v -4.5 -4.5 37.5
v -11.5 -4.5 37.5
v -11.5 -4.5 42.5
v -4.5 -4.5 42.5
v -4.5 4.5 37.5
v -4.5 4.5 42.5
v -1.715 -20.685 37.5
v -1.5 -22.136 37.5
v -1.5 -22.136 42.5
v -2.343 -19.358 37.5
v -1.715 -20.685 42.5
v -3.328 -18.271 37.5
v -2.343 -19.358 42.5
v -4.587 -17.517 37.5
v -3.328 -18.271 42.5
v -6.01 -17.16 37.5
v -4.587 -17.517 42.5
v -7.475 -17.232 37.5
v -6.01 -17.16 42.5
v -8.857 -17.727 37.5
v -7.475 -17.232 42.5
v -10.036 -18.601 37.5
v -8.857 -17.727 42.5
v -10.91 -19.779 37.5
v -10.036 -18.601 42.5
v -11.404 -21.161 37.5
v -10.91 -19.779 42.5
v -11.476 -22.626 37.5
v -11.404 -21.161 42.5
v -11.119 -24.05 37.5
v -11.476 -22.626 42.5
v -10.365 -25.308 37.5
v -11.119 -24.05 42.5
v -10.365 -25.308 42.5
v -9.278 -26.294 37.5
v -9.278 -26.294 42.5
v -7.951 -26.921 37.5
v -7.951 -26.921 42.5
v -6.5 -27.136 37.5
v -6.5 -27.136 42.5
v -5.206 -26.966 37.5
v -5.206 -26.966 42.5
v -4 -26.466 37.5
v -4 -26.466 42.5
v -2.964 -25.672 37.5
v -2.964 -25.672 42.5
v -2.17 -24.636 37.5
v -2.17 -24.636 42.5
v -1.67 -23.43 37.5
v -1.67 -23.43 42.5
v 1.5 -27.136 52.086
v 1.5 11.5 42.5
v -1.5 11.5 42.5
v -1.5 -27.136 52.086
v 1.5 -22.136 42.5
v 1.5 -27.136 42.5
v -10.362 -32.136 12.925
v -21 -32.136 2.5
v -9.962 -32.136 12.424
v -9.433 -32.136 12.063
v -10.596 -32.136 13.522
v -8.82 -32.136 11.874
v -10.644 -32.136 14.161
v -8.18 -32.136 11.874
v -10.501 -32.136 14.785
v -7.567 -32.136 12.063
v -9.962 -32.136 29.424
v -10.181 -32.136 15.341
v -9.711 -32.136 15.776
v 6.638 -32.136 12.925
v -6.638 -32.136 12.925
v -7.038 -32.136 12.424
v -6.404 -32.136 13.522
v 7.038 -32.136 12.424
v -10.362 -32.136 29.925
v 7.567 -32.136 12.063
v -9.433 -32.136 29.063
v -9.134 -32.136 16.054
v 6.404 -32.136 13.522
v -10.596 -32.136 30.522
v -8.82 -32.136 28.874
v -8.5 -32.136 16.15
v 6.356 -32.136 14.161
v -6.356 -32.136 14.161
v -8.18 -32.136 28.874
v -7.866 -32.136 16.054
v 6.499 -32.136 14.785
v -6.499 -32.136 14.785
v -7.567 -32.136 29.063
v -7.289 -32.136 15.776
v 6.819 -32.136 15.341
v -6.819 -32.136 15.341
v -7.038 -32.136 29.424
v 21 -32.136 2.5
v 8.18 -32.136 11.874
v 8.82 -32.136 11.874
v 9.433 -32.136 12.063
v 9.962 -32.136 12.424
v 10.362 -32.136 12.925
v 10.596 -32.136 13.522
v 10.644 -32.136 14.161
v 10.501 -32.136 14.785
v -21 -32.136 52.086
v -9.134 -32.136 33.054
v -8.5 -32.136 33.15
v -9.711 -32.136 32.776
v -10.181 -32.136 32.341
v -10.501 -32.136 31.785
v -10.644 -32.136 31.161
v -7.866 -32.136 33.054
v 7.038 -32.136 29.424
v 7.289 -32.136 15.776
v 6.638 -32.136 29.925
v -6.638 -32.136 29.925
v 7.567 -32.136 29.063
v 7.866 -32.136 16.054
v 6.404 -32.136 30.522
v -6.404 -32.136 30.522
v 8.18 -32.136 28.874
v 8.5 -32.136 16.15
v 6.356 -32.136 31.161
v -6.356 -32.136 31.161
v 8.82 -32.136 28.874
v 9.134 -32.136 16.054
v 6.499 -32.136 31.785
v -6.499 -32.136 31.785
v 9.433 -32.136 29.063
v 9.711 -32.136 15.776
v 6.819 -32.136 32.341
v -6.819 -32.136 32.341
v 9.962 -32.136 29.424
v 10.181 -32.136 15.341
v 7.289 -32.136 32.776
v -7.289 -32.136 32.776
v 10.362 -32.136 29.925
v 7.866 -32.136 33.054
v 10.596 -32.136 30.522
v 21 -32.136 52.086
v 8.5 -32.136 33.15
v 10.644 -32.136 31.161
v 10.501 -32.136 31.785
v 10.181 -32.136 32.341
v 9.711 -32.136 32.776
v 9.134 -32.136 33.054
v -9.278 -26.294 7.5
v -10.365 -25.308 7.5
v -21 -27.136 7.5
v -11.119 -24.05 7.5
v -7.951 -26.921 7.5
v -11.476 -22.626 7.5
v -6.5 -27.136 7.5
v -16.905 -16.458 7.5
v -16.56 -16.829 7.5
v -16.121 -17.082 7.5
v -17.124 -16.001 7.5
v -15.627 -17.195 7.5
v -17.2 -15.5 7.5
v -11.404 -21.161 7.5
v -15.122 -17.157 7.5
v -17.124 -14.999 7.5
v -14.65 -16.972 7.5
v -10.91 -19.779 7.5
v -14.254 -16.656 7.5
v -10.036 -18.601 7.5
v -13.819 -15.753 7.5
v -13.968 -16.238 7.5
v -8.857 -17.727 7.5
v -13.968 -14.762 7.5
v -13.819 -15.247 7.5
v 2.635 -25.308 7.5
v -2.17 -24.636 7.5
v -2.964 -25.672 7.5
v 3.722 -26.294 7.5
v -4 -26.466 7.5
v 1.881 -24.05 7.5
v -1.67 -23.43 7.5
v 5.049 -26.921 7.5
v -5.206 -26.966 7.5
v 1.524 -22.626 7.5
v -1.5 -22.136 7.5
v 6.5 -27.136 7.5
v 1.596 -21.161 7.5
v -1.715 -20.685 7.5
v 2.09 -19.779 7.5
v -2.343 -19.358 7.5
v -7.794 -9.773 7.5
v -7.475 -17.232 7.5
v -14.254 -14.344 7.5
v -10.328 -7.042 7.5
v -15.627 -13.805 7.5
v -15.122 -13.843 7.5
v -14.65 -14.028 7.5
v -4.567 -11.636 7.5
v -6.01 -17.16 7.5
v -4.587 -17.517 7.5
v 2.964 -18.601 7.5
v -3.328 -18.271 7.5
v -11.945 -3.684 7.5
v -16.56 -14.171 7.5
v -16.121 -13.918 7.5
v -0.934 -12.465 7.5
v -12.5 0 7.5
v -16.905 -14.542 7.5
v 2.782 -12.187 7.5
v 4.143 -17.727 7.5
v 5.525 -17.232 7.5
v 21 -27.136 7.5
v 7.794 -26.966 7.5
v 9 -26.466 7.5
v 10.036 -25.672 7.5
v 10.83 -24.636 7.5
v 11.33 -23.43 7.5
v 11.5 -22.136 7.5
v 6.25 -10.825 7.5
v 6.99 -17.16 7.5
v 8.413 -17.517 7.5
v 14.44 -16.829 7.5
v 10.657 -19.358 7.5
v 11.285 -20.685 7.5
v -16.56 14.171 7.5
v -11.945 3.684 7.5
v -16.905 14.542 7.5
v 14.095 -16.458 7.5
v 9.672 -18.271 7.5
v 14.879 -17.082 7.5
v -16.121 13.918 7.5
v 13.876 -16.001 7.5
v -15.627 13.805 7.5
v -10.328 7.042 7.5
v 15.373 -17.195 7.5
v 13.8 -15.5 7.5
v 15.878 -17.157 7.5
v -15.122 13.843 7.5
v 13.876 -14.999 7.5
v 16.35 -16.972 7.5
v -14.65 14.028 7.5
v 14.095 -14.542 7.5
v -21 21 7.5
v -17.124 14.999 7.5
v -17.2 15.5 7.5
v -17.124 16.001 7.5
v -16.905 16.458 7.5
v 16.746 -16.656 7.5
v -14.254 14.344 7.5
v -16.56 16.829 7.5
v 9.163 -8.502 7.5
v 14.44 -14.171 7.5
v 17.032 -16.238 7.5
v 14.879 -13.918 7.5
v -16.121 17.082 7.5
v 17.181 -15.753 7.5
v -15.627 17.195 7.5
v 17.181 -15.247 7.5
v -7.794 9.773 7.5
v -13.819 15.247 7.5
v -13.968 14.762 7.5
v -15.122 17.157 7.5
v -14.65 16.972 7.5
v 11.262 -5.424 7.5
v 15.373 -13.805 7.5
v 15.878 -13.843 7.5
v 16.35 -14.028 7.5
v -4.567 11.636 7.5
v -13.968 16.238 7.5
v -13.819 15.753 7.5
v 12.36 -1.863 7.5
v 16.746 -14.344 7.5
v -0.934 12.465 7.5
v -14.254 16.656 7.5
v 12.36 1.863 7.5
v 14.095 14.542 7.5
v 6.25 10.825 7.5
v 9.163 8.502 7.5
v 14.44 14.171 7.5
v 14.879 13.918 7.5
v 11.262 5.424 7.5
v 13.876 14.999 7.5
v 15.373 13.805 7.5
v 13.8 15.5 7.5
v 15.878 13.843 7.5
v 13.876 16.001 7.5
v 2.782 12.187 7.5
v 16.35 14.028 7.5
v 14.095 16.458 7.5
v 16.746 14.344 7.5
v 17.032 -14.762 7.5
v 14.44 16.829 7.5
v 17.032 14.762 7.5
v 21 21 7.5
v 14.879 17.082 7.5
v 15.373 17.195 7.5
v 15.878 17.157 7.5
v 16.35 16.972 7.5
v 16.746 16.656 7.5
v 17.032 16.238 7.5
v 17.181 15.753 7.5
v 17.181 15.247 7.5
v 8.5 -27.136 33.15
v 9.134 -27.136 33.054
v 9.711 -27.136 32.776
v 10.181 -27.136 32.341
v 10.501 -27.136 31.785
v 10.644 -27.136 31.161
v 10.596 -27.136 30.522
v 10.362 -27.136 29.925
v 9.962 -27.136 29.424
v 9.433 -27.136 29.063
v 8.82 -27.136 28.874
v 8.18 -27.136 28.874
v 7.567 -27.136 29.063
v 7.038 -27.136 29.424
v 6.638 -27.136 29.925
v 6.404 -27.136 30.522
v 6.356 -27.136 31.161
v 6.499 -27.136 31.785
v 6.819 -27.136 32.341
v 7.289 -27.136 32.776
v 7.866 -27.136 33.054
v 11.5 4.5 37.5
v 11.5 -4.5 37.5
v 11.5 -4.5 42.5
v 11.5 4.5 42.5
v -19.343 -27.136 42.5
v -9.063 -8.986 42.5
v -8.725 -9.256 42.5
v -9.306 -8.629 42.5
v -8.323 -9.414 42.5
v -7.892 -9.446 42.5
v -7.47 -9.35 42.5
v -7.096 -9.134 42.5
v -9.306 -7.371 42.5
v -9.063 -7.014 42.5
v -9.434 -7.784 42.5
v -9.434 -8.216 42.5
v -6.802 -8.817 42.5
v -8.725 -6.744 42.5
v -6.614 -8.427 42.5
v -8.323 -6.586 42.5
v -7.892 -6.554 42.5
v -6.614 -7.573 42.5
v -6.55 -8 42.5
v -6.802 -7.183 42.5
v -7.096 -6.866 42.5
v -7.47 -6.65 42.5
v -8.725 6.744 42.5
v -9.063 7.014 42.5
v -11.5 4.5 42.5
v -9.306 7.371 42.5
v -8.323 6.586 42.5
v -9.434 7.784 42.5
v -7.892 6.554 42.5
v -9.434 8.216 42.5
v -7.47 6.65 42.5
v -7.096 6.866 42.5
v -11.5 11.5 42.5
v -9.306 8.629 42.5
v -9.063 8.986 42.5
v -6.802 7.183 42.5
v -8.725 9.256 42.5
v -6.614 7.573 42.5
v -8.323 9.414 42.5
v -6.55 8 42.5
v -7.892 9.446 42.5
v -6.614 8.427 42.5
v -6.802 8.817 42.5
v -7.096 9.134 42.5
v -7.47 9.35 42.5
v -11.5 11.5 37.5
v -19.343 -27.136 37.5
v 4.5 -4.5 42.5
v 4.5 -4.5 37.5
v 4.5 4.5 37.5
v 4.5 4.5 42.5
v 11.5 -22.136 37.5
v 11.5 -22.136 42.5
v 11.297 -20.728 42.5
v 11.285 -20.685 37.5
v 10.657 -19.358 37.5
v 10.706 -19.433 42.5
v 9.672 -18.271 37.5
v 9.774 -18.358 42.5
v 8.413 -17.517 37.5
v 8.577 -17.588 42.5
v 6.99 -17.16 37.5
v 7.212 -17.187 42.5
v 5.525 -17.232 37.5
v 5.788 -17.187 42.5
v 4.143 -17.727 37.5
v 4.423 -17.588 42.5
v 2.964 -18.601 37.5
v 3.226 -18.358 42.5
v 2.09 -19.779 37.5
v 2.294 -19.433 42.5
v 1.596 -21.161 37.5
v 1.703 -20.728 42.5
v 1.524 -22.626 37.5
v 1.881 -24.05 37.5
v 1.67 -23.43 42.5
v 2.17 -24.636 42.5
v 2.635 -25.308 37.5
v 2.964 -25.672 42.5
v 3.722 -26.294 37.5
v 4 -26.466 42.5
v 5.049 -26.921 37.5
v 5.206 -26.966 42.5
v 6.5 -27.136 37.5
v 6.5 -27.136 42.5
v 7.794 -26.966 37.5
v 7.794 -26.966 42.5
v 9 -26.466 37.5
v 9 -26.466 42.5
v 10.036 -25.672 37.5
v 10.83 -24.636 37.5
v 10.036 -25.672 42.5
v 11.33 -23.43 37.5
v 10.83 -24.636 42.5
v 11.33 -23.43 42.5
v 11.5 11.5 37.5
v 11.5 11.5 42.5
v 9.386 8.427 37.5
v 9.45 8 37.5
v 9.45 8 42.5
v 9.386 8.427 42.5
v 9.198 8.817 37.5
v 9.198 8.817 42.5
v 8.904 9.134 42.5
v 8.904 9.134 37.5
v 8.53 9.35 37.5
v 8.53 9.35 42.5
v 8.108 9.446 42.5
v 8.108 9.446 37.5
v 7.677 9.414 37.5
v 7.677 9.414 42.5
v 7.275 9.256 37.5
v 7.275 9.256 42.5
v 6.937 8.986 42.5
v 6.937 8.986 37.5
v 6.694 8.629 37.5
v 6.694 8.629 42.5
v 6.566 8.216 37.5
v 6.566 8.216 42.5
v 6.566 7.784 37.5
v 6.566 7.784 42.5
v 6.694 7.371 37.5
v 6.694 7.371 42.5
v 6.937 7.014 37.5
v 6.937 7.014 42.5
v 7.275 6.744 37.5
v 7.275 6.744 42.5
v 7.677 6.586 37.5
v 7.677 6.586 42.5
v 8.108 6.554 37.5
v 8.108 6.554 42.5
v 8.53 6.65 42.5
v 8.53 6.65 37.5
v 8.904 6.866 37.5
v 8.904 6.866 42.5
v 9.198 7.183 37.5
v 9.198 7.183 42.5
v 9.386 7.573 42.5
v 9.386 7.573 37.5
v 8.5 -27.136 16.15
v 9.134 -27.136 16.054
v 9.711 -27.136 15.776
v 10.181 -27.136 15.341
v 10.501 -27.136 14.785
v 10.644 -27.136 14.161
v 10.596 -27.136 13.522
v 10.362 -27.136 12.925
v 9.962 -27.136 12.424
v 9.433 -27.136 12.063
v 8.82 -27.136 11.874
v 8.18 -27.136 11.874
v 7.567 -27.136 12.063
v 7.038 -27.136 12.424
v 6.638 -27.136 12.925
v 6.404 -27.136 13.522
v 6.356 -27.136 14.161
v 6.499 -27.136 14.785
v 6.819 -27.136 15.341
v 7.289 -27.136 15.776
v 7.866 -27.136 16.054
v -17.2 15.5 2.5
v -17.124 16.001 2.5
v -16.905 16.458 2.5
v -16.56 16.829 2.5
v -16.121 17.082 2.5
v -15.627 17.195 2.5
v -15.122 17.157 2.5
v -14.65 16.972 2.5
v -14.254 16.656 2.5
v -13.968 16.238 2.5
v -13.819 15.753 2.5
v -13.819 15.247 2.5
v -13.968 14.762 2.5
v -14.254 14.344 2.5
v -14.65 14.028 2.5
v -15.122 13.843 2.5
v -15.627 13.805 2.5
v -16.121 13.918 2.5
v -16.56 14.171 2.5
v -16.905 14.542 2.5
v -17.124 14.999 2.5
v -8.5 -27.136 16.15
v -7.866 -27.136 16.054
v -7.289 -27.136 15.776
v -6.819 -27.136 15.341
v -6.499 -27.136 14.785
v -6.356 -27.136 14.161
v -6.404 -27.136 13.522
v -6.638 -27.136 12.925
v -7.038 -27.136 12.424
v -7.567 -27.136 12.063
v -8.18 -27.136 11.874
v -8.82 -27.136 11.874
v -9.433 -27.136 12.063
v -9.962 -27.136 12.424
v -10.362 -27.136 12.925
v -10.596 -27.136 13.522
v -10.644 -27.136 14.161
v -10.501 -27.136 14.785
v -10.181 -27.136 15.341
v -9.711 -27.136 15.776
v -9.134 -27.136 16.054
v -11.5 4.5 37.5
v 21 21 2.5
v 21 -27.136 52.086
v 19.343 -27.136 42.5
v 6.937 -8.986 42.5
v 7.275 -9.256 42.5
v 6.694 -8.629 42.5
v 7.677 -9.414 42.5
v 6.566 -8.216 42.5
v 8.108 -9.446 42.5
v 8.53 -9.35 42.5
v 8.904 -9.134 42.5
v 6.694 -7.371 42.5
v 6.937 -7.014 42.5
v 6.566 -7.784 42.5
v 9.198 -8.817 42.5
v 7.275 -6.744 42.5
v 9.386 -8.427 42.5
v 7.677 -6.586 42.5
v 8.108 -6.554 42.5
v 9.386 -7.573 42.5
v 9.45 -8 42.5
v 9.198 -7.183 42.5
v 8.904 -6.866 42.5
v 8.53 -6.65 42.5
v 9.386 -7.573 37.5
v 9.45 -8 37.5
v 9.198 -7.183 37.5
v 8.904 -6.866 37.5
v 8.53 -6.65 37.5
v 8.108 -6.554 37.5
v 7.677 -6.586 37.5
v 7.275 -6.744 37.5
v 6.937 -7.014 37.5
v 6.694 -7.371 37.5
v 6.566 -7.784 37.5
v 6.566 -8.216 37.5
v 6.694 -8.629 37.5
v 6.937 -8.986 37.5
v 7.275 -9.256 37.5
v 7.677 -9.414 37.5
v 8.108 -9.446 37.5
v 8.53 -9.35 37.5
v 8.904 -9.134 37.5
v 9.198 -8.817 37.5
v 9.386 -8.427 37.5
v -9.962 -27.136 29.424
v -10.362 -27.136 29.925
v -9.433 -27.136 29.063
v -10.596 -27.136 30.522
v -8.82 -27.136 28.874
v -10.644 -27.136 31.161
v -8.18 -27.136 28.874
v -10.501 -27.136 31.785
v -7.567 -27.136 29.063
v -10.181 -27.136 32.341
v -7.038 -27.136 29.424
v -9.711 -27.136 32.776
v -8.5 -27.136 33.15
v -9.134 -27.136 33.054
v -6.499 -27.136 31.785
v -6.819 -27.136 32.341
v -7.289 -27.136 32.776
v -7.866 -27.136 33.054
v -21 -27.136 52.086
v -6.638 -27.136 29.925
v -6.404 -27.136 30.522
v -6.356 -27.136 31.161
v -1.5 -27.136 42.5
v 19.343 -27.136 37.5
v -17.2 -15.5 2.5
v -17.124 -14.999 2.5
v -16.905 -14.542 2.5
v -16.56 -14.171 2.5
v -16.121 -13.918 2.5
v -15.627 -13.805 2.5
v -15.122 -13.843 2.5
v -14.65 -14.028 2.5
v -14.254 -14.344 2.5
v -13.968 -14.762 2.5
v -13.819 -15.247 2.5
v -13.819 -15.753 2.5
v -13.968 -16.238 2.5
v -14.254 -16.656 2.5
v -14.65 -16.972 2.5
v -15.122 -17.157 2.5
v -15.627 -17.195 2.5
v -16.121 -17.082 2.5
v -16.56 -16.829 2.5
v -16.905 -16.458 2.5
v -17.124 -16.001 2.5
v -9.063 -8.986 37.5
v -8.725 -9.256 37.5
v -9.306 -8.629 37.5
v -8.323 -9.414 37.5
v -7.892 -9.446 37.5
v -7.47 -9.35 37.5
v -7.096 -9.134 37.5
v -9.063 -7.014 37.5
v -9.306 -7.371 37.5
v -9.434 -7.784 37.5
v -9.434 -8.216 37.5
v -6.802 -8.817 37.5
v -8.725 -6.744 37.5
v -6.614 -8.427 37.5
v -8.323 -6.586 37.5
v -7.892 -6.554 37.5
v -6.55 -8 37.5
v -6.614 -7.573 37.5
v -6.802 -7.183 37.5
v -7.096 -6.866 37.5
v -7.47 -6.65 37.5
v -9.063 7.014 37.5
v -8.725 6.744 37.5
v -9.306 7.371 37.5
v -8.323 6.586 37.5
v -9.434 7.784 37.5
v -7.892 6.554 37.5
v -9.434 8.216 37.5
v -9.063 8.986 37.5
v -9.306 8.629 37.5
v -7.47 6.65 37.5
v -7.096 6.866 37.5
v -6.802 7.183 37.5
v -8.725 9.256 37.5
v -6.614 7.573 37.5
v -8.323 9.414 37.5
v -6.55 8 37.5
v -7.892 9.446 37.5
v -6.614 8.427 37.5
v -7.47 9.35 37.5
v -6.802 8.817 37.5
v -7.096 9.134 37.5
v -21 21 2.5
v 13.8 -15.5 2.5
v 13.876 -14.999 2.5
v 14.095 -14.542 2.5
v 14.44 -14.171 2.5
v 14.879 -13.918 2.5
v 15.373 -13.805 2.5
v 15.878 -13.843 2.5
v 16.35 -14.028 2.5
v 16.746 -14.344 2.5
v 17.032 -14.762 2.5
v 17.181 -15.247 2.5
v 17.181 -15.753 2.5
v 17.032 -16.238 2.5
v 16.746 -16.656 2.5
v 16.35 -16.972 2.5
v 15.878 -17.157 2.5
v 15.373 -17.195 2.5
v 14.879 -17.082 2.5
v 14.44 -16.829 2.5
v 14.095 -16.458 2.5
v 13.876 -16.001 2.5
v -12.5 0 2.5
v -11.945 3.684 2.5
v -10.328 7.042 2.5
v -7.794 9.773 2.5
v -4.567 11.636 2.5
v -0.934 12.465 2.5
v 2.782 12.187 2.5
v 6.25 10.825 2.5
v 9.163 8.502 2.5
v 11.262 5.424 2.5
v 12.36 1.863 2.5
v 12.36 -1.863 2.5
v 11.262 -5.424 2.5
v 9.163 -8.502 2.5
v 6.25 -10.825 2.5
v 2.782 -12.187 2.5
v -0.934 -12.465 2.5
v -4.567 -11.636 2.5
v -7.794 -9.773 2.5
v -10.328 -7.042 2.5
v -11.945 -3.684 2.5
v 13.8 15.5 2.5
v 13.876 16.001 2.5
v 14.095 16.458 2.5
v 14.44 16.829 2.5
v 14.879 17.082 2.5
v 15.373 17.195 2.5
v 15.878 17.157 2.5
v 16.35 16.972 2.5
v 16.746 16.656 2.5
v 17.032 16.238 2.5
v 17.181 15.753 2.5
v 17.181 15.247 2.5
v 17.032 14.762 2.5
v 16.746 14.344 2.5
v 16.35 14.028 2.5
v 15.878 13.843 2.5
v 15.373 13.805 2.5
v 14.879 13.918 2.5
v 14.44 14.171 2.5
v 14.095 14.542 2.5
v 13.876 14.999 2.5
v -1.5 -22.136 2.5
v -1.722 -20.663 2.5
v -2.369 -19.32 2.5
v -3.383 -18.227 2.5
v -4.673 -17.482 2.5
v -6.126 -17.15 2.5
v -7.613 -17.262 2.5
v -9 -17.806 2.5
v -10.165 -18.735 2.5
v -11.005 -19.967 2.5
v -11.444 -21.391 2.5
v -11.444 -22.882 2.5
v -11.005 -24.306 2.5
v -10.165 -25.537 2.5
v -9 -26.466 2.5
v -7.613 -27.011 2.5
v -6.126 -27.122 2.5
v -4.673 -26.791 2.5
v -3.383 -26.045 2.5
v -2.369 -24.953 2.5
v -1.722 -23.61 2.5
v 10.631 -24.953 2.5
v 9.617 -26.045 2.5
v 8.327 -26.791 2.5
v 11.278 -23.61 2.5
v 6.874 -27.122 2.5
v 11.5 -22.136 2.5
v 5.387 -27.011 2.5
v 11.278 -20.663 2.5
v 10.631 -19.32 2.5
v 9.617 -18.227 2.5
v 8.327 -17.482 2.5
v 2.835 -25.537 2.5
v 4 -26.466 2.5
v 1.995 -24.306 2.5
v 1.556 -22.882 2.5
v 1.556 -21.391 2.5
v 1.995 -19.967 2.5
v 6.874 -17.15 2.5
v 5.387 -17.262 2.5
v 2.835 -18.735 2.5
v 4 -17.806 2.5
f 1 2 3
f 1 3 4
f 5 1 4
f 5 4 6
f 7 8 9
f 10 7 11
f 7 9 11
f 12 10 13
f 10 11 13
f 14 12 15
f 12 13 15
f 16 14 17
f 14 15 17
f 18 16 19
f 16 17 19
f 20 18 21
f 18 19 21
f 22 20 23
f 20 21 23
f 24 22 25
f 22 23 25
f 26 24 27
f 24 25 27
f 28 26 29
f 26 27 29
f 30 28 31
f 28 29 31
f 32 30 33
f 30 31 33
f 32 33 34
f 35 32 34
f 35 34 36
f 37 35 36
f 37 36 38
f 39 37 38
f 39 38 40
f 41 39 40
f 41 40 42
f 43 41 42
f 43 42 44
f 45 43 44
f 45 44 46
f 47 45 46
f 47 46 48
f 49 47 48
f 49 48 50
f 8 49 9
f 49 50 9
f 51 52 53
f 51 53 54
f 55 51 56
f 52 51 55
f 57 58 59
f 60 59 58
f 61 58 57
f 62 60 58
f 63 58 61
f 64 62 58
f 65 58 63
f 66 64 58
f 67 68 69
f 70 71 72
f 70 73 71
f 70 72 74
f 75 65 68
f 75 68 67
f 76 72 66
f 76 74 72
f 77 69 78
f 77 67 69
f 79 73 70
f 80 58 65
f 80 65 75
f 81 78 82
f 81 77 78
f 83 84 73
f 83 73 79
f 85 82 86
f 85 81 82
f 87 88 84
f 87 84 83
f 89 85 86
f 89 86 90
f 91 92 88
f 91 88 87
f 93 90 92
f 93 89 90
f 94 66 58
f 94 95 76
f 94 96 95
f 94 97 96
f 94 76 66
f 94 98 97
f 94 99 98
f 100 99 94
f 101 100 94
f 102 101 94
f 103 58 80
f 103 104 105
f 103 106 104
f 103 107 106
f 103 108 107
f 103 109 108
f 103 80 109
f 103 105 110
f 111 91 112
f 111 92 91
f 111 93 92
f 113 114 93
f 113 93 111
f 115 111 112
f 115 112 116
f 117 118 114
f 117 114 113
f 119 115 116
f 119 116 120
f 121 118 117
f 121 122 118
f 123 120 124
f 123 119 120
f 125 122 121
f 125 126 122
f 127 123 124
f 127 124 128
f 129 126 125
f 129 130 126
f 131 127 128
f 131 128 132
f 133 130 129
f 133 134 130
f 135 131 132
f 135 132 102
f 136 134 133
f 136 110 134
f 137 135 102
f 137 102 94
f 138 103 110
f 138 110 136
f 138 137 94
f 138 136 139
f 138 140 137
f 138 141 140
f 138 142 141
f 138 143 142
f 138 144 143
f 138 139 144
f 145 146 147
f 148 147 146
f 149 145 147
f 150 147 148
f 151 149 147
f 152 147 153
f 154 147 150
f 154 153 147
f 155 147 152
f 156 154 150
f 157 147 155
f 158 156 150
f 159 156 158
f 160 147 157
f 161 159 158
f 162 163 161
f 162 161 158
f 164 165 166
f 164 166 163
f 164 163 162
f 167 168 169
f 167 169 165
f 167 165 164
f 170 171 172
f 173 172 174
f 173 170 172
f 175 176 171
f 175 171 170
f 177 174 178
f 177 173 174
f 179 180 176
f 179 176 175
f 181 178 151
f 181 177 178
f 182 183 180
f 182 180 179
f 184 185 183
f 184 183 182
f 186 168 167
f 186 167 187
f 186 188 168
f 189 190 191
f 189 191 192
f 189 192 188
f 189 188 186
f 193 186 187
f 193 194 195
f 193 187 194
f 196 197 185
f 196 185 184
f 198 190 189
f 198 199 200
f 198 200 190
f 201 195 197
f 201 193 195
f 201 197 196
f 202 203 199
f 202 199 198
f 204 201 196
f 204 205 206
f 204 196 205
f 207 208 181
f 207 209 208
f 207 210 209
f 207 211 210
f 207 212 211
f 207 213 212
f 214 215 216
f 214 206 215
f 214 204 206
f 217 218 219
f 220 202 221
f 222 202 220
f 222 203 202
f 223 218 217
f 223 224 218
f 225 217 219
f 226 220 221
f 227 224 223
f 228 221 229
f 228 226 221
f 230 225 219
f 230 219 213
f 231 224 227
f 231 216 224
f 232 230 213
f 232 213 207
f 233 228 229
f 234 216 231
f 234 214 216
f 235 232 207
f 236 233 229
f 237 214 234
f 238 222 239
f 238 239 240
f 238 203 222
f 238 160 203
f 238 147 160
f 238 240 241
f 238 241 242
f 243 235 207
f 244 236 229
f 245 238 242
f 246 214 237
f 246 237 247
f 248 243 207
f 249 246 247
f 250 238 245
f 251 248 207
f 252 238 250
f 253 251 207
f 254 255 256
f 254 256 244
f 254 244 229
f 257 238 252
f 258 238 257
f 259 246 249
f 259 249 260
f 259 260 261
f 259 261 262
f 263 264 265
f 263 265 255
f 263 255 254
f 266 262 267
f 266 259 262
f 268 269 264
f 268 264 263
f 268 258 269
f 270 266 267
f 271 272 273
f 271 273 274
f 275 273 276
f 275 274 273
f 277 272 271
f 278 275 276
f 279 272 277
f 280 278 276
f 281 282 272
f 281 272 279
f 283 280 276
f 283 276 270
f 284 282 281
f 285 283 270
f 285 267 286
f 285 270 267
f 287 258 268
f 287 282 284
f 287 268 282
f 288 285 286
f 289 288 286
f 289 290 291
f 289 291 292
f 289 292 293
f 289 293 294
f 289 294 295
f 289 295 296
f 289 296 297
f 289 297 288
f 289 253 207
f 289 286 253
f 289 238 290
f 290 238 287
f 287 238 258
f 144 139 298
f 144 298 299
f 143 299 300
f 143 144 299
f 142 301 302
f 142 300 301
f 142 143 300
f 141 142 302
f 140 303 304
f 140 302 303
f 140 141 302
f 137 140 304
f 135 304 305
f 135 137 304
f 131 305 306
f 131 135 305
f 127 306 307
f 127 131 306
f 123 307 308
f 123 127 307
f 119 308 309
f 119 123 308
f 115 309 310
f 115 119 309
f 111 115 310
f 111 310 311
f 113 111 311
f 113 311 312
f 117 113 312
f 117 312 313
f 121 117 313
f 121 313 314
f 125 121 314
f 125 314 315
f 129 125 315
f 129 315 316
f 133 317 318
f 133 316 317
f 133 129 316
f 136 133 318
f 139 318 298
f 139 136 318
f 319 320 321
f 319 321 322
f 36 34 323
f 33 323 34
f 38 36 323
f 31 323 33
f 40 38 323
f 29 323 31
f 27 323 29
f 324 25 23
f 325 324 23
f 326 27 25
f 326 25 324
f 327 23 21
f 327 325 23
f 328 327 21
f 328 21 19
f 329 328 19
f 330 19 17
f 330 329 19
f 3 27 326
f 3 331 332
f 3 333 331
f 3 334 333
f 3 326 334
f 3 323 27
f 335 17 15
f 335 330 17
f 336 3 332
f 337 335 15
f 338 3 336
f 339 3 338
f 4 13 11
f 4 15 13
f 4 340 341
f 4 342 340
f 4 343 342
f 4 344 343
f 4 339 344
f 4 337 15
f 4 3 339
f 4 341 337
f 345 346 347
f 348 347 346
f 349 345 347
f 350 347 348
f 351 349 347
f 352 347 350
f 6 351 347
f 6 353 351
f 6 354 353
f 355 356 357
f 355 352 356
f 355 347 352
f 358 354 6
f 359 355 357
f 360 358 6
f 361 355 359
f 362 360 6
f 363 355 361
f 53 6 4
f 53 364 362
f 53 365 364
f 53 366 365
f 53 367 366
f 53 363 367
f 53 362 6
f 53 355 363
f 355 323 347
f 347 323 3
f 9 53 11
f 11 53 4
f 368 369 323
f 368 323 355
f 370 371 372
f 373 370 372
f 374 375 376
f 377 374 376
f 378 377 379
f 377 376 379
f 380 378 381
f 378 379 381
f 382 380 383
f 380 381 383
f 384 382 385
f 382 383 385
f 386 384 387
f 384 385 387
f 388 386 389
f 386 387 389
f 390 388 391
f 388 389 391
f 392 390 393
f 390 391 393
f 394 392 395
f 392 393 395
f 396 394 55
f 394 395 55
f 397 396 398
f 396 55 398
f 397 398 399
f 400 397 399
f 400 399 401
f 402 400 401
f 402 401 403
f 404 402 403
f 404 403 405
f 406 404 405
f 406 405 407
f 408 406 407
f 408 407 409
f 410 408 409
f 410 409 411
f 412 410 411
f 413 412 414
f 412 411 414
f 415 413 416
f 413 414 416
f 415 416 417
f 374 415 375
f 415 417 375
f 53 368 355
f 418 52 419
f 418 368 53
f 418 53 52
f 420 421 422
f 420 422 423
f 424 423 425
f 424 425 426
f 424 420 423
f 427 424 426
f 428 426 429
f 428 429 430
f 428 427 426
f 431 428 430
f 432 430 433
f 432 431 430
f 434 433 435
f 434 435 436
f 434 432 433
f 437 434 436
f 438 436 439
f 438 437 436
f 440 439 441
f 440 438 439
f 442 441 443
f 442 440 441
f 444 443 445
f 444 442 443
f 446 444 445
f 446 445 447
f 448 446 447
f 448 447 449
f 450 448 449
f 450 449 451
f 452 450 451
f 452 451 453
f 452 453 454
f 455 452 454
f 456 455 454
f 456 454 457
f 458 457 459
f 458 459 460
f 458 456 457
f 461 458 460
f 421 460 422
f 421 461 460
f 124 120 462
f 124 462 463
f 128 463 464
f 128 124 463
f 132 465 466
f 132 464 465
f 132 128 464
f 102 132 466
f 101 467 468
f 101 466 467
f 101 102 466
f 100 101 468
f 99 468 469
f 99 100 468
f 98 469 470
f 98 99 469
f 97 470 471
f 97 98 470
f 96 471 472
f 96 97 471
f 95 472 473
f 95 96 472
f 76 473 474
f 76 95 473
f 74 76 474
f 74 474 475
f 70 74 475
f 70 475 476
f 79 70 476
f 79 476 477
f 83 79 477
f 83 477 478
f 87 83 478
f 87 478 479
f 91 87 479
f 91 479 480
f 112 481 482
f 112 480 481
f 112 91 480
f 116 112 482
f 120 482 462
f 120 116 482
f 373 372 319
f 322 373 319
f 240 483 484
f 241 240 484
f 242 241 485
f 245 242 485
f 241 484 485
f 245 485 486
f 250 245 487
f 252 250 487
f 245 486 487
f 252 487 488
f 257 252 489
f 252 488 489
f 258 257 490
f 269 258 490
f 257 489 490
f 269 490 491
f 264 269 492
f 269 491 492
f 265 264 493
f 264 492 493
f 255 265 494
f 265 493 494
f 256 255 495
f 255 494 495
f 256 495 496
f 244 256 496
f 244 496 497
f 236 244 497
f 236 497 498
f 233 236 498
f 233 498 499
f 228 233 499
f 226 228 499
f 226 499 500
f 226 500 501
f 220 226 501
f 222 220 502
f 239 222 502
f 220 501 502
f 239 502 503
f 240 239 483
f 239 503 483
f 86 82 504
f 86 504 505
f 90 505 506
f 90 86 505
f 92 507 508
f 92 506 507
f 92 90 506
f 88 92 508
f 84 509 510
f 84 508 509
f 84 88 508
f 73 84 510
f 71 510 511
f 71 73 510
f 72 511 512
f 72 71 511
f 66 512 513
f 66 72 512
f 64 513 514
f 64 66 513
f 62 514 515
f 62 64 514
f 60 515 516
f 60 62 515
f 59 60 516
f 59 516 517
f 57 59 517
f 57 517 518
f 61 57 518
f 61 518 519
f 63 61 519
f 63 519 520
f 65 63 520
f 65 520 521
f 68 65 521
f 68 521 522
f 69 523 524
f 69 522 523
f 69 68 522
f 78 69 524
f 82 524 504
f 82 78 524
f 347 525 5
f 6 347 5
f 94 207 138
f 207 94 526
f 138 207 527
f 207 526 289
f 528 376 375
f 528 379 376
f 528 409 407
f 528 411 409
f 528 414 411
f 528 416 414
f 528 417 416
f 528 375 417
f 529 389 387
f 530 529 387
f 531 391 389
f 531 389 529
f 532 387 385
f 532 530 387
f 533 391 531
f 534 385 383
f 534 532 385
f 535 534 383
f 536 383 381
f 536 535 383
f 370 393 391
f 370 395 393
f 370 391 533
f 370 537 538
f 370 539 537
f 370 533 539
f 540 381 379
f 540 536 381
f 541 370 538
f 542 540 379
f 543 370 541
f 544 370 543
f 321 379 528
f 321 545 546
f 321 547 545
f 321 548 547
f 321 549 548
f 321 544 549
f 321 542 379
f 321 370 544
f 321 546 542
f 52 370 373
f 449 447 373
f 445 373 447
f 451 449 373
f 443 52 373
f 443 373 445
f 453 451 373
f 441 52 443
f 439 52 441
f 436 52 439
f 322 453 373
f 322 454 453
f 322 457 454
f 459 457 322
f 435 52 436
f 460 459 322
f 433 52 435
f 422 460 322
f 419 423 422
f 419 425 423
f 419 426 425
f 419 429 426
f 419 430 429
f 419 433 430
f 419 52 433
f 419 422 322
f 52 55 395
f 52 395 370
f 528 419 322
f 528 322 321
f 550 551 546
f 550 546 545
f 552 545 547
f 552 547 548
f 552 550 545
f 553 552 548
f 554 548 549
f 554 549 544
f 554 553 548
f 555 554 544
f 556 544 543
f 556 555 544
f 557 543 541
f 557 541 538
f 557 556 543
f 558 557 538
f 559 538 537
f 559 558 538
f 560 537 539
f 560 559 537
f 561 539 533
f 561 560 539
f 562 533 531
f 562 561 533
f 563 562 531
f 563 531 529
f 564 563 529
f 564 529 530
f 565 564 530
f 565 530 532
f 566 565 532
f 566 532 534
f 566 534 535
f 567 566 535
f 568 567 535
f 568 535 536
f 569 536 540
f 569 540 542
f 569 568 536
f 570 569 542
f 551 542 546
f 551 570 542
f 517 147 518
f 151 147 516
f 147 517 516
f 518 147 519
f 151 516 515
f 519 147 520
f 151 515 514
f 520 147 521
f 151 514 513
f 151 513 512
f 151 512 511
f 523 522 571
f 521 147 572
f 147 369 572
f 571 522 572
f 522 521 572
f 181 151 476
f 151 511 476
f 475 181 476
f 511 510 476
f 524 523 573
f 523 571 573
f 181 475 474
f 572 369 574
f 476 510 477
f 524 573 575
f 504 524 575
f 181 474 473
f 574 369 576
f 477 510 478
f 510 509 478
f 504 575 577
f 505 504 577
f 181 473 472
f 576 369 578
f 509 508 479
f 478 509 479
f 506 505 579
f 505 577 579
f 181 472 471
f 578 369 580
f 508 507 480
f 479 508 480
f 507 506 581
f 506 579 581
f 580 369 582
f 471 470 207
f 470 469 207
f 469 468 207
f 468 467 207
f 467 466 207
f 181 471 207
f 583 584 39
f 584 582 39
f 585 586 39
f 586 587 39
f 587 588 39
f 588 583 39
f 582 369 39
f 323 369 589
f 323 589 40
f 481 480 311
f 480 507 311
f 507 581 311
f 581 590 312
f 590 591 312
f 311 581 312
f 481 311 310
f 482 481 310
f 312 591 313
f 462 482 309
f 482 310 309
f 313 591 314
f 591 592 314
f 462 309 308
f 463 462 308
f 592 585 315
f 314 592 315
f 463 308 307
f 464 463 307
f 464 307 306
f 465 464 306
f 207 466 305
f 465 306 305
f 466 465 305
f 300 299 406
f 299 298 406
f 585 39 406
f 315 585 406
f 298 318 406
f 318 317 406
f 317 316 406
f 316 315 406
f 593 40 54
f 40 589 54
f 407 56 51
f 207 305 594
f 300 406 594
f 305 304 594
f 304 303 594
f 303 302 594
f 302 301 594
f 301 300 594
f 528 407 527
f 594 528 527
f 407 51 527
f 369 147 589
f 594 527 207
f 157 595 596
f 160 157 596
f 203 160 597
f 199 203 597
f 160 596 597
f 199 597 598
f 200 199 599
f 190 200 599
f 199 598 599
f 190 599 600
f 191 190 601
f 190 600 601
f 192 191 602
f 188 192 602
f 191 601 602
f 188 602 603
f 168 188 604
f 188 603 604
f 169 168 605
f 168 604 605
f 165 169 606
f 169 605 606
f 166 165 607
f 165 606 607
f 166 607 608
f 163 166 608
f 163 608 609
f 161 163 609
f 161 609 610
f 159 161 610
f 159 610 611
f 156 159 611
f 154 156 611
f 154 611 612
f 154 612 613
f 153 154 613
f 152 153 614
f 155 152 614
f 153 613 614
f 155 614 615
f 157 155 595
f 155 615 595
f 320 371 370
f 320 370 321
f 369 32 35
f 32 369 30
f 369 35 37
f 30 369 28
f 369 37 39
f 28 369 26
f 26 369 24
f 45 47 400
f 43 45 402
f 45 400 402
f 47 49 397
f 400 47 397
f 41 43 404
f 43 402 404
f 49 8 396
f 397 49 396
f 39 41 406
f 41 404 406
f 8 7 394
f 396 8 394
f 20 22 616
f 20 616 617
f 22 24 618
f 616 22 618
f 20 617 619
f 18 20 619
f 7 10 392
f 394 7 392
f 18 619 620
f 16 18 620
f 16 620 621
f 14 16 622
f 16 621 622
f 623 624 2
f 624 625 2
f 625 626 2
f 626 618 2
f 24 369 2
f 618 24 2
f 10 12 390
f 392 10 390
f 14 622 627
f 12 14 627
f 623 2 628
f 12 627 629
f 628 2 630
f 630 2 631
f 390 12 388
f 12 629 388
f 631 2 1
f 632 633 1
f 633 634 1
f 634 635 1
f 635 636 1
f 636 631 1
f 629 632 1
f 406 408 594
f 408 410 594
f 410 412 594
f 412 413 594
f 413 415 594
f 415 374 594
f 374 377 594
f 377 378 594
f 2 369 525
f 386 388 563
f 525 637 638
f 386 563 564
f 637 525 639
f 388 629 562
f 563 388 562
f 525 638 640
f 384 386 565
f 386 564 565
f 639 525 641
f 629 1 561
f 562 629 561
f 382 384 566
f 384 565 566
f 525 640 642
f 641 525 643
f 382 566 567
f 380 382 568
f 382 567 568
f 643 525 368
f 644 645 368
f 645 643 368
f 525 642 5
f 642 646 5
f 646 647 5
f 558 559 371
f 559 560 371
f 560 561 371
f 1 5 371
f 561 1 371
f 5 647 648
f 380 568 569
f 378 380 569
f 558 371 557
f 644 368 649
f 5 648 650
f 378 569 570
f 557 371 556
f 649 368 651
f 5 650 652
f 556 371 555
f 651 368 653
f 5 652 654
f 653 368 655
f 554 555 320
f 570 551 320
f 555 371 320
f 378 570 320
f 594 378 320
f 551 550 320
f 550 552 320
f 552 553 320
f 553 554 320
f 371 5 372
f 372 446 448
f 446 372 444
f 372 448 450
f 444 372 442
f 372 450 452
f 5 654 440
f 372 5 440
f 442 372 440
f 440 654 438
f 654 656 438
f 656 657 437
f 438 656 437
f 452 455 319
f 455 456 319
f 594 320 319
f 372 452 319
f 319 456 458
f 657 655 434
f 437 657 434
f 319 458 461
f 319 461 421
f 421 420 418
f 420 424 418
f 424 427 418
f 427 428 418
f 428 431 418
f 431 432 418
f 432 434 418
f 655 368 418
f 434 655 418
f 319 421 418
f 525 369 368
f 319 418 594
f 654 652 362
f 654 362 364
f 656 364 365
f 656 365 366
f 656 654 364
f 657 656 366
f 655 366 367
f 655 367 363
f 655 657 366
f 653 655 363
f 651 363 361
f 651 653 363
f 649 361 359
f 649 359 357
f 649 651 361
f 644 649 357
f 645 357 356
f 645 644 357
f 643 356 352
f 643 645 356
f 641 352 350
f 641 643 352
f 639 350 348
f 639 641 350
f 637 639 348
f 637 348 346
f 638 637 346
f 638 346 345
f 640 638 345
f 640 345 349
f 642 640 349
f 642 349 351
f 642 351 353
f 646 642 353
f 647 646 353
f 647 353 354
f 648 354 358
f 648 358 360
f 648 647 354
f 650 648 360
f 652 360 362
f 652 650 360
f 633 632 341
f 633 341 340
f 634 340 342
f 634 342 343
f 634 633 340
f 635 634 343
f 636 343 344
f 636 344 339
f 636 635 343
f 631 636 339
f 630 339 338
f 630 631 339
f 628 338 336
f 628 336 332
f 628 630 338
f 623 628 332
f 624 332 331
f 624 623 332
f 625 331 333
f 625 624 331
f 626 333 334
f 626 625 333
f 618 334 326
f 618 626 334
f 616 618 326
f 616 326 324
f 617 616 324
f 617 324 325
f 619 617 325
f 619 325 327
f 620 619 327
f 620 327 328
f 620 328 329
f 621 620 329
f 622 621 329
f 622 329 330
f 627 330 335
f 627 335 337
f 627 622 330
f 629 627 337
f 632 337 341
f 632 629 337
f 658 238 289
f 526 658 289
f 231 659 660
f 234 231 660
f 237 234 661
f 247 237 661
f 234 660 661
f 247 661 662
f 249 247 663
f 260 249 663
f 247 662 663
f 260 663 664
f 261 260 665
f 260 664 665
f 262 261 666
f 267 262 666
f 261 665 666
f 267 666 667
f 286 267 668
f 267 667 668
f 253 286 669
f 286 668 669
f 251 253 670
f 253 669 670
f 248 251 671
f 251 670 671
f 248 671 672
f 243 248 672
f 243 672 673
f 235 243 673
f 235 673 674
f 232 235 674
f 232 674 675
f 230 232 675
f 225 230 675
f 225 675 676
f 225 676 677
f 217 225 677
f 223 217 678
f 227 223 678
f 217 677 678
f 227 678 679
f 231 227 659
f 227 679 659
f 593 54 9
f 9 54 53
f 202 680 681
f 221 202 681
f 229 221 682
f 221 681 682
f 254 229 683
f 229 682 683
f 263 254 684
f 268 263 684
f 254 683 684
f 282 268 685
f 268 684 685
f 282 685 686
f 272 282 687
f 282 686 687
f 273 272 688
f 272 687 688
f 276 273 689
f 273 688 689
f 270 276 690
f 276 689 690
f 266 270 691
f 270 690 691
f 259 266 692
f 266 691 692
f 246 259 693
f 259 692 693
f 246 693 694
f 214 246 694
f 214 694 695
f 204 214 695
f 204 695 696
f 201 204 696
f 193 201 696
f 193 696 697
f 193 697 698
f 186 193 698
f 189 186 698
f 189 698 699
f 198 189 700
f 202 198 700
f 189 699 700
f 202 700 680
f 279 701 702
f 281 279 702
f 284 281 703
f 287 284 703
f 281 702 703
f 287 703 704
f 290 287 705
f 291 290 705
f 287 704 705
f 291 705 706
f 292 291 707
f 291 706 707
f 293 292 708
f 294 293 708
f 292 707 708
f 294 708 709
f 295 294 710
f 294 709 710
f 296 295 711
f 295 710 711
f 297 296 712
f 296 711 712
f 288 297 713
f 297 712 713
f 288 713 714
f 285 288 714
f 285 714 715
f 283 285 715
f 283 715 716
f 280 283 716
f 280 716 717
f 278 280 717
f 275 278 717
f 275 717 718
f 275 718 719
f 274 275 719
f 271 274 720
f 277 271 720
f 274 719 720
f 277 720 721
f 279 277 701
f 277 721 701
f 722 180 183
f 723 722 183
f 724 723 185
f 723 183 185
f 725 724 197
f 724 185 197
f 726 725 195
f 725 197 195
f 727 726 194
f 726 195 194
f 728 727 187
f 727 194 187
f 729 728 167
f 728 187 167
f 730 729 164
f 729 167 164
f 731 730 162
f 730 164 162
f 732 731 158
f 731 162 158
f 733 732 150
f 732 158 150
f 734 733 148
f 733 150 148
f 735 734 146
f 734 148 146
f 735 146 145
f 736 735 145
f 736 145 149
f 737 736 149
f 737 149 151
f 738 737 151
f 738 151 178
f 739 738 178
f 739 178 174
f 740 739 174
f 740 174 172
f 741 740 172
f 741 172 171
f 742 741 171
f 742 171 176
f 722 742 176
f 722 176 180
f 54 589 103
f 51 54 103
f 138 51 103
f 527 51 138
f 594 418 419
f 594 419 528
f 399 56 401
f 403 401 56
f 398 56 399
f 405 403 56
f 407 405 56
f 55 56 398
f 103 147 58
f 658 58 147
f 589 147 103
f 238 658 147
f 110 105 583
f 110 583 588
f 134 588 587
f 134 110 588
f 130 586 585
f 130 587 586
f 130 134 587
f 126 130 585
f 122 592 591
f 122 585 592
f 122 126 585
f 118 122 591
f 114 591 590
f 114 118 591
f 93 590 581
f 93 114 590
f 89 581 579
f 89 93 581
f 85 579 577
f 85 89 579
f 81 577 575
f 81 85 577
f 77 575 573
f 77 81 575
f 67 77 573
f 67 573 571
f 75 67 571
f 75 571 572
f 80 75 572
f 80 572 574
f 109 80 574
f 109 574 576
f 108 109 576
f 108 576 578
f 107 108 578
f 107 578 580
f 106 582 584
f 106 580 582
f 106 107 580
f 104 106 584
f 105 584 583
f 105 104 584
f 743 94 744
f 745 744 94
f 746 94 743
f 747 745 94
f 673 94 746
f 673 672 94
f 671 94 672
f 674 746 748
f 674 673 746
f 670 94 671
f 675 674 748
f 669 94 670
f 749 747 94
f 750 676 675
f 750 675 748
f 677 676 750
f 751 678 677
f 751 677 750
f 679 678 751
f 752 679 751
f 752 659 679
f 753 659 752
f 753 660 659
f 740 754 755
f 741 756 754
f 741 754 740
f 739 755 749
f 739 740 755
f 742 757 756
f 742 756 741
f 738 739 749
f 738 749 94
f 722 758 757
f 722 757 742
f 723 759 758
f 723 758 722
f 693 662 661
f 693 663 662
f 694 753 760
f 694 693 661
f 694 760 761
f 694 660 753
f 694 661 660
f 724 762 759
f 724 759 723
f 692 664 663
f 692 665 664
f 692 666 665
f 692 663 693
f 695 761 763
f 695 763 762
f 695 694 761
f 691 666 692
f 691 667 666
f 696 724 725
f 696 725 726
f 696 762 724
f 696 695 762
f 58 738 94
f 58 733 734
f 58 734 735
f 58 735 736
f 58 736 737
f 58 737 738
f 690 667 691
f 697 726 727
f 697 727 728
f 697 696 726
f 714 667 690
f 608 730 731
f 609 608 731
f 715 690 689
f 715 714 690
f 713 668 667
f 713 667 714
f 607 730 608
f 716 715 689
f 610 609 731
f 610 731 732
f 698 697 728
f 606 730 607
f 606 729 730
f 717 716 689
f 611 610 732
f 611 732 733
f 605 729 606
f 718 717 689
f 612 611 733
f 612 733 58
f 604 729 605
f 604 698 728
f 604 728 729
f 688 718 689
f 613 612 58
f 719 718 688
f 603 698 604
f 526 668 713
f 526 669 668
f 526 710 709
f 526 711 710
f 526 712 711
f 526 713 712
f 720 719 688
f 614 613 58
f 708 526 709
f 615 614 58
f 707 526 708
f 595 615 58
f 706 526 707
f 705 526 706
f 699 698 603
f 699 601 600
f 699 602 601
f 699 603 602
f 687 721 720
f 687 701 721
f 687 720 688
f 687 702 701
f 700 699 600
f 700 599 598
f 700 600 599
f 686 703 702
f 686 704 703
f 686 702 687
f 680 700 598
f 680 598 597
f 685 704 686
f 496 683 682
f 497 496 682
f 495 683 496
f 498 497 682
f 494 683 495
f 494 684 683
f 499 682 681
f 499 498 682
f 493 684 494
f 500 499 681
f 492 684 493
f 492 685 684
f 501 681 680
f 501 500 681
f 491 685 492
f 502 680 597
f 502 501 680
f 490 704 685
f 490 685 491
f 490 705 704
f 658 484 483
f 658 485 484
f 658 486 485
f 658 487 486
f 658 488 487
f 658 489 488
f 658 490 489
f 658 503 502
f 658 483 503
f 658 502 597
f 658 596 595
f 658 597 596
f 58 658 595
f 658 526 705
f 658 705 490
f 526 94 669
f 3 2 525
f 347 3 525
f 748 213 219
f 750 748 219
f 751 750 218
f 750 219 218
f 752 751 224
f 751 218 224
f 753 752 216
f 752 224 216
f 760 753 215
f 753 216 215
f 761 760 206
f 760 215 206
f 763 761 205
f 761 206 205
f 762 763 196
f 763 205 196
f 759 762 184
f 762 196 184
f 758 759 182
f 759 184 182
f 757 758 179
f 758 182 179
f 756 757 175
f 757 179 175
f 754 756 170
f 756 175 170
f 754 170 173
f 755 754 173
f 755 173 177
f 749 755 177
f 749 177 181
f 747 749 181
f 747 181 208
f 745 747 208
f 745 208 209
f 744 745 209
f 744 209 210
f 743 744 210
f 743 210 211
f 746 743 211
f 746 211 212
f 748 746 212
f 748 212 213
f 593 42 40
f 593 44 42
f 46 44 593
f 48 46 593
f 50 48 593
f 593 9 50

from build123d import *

# Parameters (mm, degrees)
MOTOR_MOUNT_SOLID_DEPTH                   = 7.5
ENCODER_DISTANCE_SKETCH_W                 = 50
ENCODER_DISTANCE_SKETCH_H                 = 45
ENCODER_DISTANCE_SOLID_DEPTH              = 5
ENCODER_MOUNT_SKETCH_R                    = 1.45
ENCODER_MOUNT_SKETCH_W                    = 7
ENCODER_MOUNT_SKETCH_H                    = 9
ENCODER_MOUNT_SOLID_DEPTH                 = 5
MOTOR_CLAMP_MOUNTING_HOLES_CUT_DEPTH      = 78.661122835
MOTOR_CLAMP_MOUNTING_HOLES_CUT_DEPTH_BACK = 78.661122835
MOTOR_CLAMP_MOUNTING_HOLES_SKETCH_R       = 1.45
GUSSET_PLATE_SKETCH_W                     = 50
GUSSET_PLATE_SKETCH_H                     = 5
GUSSET_PLATE_SOLID_DEPTH                  = 16.5
GUSSET_SOLID_DEPTH                        = 1.5
MOUNTING_PLATE_SKETCH_W                   = 50
MOUNTING_PLATE_SKETCH_H                   = 92
MOUNTING_PLATE_SKETCH_R                   = 2.65
MOUNTING_PLATE_SOLID_DEPTH                = 5
MOUNTING_HOLES_CUT_DEPTH                  = 93.348524623
MOUNTING_HOLES_CUT_DEPTH_BACK             = 93.348524623
MOUNTING_HOLE_SKETCH_R                    = 2.65
MOUNTING_PLATE_TRIM_SKETCH_W              = 50
MOUNTING_PLATE_TRIM_SKETCH_H              = 25.5
MOUNTING_PLATE_TRIM_SKETCH_H_2            = 30
MOUNTING_PLATE_TRIM_SKETCH_W_2            = 23.5
MOUNTING_PLATE_TRIM_SKETCH_H_3            = 16.5
MOUNTING_PLATE_TRIM_CUT_DEPTH             = 2
CUT_EXTRUDE1_DEPTH                        = 93.990590922
CUT_EXTRUDE1_DEPTH_BACK                   = 93.990590922
SKETCH2_W                                 = 50
SKETCH2_H                                 = 120
SKETCH2_W_2                               = 42
SKETCH2_H_2                               = 54.272597004
SKETCH3_W                                 = 42
SKETCH3_H                                 = 59.586450004
BOSS_EXTRUDE1_DEPTH                       = 5
CUT_EXTRUDE2_DEPTH                        = 69.16716098
CUT_EXTRUDE2_DEPTH_BACK                   = 69.16716098
SKETCH4_R                                 = 2.15
SKETCH5_W                                 = 42
SKETCH5_H                                 = 42
BOSS_EXTRUDE2_DEPTH                       = 5
SKETCH6_W                                 = 42
SKETCH6_H                                 = 53.136298502
CUT_EXTRUDE3_DEPTH                        = 10
SKETCH7_R                                 = 12.5
SKETCH7_R_2                               = 1.7
CUT_EXTRUDE4_DEPTH                        = 5
SKETCH8_R                                 = 5
CUT_EXTRUDE5_DEPTH                        = 56.441335495


with BuildPart() as part:
    # Mouting Mount Sketch → Motor Mount Solid (new, symmetric)
    with BuildSketch(Plane.XY):
        with BuildLine():
            Line((-25, -55), (25, -55))
            Line((25, -55), (25, 0))
            Line((25, 0), (10, 0))
            ThreePointArc((10, 0), (0, -10), (-10, 0))
            Line((-10, 0), (-25, 0))
            Line((-25, 0), (-25, -55))
        make_face()
    extrude(amount=MOTOR_MOUNT_SOLID_DEPTH, both=True)

    # Encoder Distance Sketch → Encoder Distance Solid (add)
    with BuildSketch(Plane.XZ.offset(55)):
        with Locations((0, 15)):
            Rectangle(ENCODER_DISTANCE_SKETCH_W, ENCODER_DISTANCE_SKETCH_H)
    extrude(amount=ENCODER_DISTANCE_SOLID_DEPTH)

    # Encoder Mount Sketch → Encoder Mount Solid (add)
    with BuildSketch(Plane.XY.offset(37.5)):
        Polygon((-25, -60), (-25, -55), (-11.5, 11.5), (11.5, 11.5), (25, -55), (25, -60), align=None)
        with Locations((-8, 8)):
            Circle(ENCODER_MOUNT_SKETCH_R, mode=Mode.SUBTRACT)
        with Locations((8, 8)):
            Circle(ENCODER_MOUNT_SKETCH_R, mode=Mode.SUBTRACT)
        with Locations((-8, -8)):
            Circle(ENCODER_MOUNT_SKETCH_R, mode=Mode.SUBTRACT)
        with Locations((8, -8)):
            Circle(ENCODER_MOUNT_SKETCH_R, mode=Mode.SUBTRACT)
        with Locations((-8, 0)):
            Rectangle(ENCODER_MOUNT_SKETCH_W, ENCODER_MOUNT_SKETCH_H, mode=Mode.SUBTRACT)
        with Locations((8, 0)):
            Rectangle(ENCODER_MOUNT_SKETCH_W, ENCODER_MOUNT_SKETCH_H, mode=Mode.SUBTRACT)
    extrude(amount=ENCODER_MOUNT_SOLID_DEPTH)

    # Motor Clamp Mounting Holes Sketch → Motor Clamp Mounting Holes Cut (cut, two sides: drawn at the far end of the back side and taken through both)
    with BuildSketch(Plane(origin=(0, 0, 0), x_dir=(1, 0, 0), z_dir=(0, 1, 0)).offset(-MOTOR_CLAMP_MOUNTING_HOLES_CUT_DEPTH_BACK)):
        with Locations(Location((-15, 0, 0), (0, 0, 180))):
            Circle(MOTOR_CLAMP_MOUNTING_HOLES_SKETCH_R)
        with Locations(Location((15, 0, 0), (0, 0, 180))):
            Circle(MOTOR_CLAMP_MOUNTING_HOLES_SKETCH_R)
    extrude(amount=MOTOR_CLAMP_MOUNTING_HOLES_CUT_DEPTH + MOTOR_CLAMP_MOUNTING_HOLES_CUT_DEPTH_BACK, mode=Mode.SUBTRACT)

    # Gusset Plate Sketch → Gusset Plate Solid (add)
    with BuildSketch(Plane.XY.offset(42.5)):
        with Locations((0, -57.5)):
            Rectangle(GUSSET_PLATE_SKETCH_W, GUSSET_PLATE_SKETCH_H)
    extrude(amount=GUSSET_PLATE_SOLID_DEPTH)

    # Gusset Sketch → Gusset Solid (add, symmetric)
    with BuildSketch(Plane(origin=(0, 0, 0), x_dir=(0, 0, -1), z_dir=(1, 0, 0))):
        Polygon((-42.5, 11.5), (-59, -55), (-42.5, -55), align=None)
    extrude(amount=GUSSET_SOLID_DEPTH, both=True)

    # Mounting Plate Sketch → Mounting Plate Solid (add)
    with BuildSketch(Plane(origin=(0, -55, 0), x_dir=(1, 0, 0), z_dir=(0, 1, 0))):
        with Locations((0, -13)):
            Rectangle(MOUNTING_PLATE_SKETCH_W, MOUNTING_PLATE_SKETCH_H)
        with Locations((-19, -53)):
            Circle(MOUNTING_PLATE_SKETCH_R, mode=Mode.SUBTRACT)
        with Locations((19, -53)):
            Circle(MOUNTING_PLATE_SKETCH_R, mode=Mode.SUBTRACT)
        with Locations(Location((-19, 27, 0), (0, 0, 270))):
            Circle(MOUNTING_PLATE_SKETCH_R, mode=Mode.SUBTRACT)
        with Locations(Location((19, 27, 0), (0, 0, 270))):
            Circle(MOUNTING_PLATE_SKETCH_R, mode=Mode.SUBTRACT)
    extrude(amount=-MOUNTING_PLATE_SOLID_DEPTH)

    # Mounting Hole Sketch → Mounting Holes Cut (cut, two sides: drawn at the far end of the back side and taken through both)
    with BuildSketch(Plane(origin=(0, -55, 0), x_dir=(1, 0, 0), z_dir=(0, 1, 0)).offset(-MOUNTING_HOLES_CUT_DEPTH_BACK)):
        with Locations(Location((-19, 27, 0), (0, 0, 270))):
            Circle(MOUNTING_HOLE_SKETCH_R)
        with Locations(Location((19, 27, 0), (0, 0, 270))):
            Circle(MOUNTING_HOLE_SKETCH_R)
        with Locations(Location((19, -53, 0), (0, 0, 90))):
            Circle(MOUNTING_HOLE_SKETCH_R)
        with Locations(Location((-19, -53, 0), (0, 0, 90))):
            Circle(MOUNTING_HOLE_SKETCH_R)
    extrude(amount=MOUNTING_HOLES_CUT_DEPTH + MOUNTING_HOLES_CUT_DEPTH_BACK, mode=Mode.SUBTRACT)

    # Mounting Plate Trim Sketch → Mounting Plate Trim Cut (cut)
    with BuildSketch(Plane(origin=(0, -55, 0), x_dir=(1, 0, 0), z_dir=(0, 1, 0))):
        with Locations((0, 20.25)):
            Rectangle(MOUNTING_PLATE_TRIM_SKETCH_W, MOUNTING_PLATE_TRIM_SKETCH_H)
        with Locations((0, -22.5)):
            Rectangle(MOUNTING_PLATE_TRIM_SKETCH_W, MOUNTING_PLATE_TRIM_SKETCH_H_2)
        with Locations((13.25, -50.75)):
            Rectangle(MOUNTING_PLATE_TRIM_SKETCH_W_2, MOUNTING_PLATE_TRIM_SKETCH_H_3)
        with Locations((-13.25, -50.75)):
            Rectangle(MOUNTING_PLATE_TRIM_SKETCH_W_2, MOUNTING_PLATE_TRIM_SKETCH_H_3)
    extrude(amount=-MOUNTING_PLATE_TRIM_CUT_DEPTH, mode=Mode.SUBTRACT)

    # Sketch2 → Cut-Extrude1 (cut, two sides: drawn at the far end of the back side and taken through both)
    with BuildSketch(Plane(origin=(0, 0, -7.5), x_dir=(-1, 0, 0), z_dir=(0, 0, -1)).offset(-CUT_EXTRUDE1_DEPTH_BACK)):
        Rectangle(SKETCH2_W, SKETCH2_H)
        Rectangle(SKETCH2_W_2, SKETCH2_H_2, mode=Mode.SUBTRACT)
    extrude(amount=CUT_EXTRUDE1_DEPTH + CUT_EXTRUDE1_DEPTH_BACK, mode=Mode.SUBTRACT)


with BuildPart() as cut_extrude1_piece_1:
    # of the separate pieces the step leaves, piece 1, a body of its own (cut_extrude1_pieces)
    add(part.part.solids().sort_by_distance((21, 0, 7.5))[0])



with BuildPart() as cut_extrude1_piece_2:
    # of the separate pieces the step leaves, piece 2, a body of its own (cut_extrude1_pieces)
    add(part.part.solids().sort_by_distance((-1.5, -27.136298502, 42.5))[0])


with BuildPart() as cut_extrude1_piece_1_1:
    add(cut_extrude1_piece_1.part)

    add(cut_extrude1_piece_2.part)  # Boss-Extrude1 merges Cut-Extrude1 piece 2
    # Sketch3 → Boss-Extrude1 (add)
    with BuildSketch(Plane.XZ.offset(27.136298502)):
        with Locations((0, 22.293225002)):
            Rectangle(SKETCH3_W, SKETCH3_H)
    extrude(amount=BOSS_EXTRUDE1_DEPTH)

    # Sketch4 → Cut-Extrude2 (cut, two sides: drawn at the far end of the back side and taken through both)
    with BuildSketch(Plane(origin=(0, -27.136298502, 0), x_dir=(1, 0, 0), z_dir=(0, 1, 0)).offset(-CUT_EXTRUDE2_DEPTH_BACK)):
        with Locations(Location((-8.5, -14, 0), (0, 0, 270))):
            Circle(SKETCH4_R)
        with Locations(Location((8.5, -14, 0), (0, 0, 270))):
            Circle(SKETCH4_R)
        with Locations(Location((-8.5, -31, 0), (0, 0, 270))):
            Circle(SKETCH4_R)
        with Locations(Location((8.5, -31, 0), (0, 0, 270))):
            Circle(SKETCH4_R)
    extrude(amount=CUT_EXTRUDE2_DEPTH + CUT_EXTRUDE2_DEPTH_BACK, mode=Mode.SUBTRACT)

    # Sketch5 → Boss-Extrude2 (add)
    with BuildSketch(Plane.XY.offset(7.5)):
        Rectangle(SKETCH5_W, SKETCH5_H)
    extrude(amount=-BOSS_EXTRUDE2_DEPTH)

    # Sketch6 → Cut-Extrude3 (cut)
    with BuildSketch(Plane(origin=(0, 0, -7.5), x_dir=(-1, 0, 0), z_dir=(0, 0, -1))):
        with Locations((0, -5.568149251)):
            Rectangle(SKETCH6_W, SKETCH6_H)
    extrude(amount=-CUT_EXTRUDE3_DEPTH, mode=Mode.SUBTRACT)

    # Sketch7 → Cut-Extrude4 (cut)
    with BuildSketch(Plane(origin=(0, 0, 2.5), x_dir=(-1, 0, 0), z_dir=(0, 0, -1))):
        Circle(SKETCH7_R)
        with Locations((-15.5, 15.5)):
            Circle(SKETCH7_R_2)
        with Locations((15.5, 15.5)):
            Circle(SKETCH7_R_2)
        with Locations((-15.5, -15.5)):
            Circle(SKETCH7_R_2)
        with Locations((15.5, -15.5)):
            Circle(SKETCH7_R_2)
    extrude(amount=-CUT_EXTRUDE4_DEPTH, mode=Mode.SUBTRACT)

    # Sketch8 → Cut-Extrude5 (cut, through all)
    with BuildSketch(Plane.XY.offset(42.5)):
        with Locations((-6.5, -22.136298502)):
            Circle(SKETCH8_R)
        with Locations((6.5, -22.136298502)):
            Circle(SKETCH8_R)
    extrude(amount=-CUT_EXTRUDE5_DEPTH, mode=Mode.SUBTRACT)


solid = cut_extrude1_piece_1_1.part
